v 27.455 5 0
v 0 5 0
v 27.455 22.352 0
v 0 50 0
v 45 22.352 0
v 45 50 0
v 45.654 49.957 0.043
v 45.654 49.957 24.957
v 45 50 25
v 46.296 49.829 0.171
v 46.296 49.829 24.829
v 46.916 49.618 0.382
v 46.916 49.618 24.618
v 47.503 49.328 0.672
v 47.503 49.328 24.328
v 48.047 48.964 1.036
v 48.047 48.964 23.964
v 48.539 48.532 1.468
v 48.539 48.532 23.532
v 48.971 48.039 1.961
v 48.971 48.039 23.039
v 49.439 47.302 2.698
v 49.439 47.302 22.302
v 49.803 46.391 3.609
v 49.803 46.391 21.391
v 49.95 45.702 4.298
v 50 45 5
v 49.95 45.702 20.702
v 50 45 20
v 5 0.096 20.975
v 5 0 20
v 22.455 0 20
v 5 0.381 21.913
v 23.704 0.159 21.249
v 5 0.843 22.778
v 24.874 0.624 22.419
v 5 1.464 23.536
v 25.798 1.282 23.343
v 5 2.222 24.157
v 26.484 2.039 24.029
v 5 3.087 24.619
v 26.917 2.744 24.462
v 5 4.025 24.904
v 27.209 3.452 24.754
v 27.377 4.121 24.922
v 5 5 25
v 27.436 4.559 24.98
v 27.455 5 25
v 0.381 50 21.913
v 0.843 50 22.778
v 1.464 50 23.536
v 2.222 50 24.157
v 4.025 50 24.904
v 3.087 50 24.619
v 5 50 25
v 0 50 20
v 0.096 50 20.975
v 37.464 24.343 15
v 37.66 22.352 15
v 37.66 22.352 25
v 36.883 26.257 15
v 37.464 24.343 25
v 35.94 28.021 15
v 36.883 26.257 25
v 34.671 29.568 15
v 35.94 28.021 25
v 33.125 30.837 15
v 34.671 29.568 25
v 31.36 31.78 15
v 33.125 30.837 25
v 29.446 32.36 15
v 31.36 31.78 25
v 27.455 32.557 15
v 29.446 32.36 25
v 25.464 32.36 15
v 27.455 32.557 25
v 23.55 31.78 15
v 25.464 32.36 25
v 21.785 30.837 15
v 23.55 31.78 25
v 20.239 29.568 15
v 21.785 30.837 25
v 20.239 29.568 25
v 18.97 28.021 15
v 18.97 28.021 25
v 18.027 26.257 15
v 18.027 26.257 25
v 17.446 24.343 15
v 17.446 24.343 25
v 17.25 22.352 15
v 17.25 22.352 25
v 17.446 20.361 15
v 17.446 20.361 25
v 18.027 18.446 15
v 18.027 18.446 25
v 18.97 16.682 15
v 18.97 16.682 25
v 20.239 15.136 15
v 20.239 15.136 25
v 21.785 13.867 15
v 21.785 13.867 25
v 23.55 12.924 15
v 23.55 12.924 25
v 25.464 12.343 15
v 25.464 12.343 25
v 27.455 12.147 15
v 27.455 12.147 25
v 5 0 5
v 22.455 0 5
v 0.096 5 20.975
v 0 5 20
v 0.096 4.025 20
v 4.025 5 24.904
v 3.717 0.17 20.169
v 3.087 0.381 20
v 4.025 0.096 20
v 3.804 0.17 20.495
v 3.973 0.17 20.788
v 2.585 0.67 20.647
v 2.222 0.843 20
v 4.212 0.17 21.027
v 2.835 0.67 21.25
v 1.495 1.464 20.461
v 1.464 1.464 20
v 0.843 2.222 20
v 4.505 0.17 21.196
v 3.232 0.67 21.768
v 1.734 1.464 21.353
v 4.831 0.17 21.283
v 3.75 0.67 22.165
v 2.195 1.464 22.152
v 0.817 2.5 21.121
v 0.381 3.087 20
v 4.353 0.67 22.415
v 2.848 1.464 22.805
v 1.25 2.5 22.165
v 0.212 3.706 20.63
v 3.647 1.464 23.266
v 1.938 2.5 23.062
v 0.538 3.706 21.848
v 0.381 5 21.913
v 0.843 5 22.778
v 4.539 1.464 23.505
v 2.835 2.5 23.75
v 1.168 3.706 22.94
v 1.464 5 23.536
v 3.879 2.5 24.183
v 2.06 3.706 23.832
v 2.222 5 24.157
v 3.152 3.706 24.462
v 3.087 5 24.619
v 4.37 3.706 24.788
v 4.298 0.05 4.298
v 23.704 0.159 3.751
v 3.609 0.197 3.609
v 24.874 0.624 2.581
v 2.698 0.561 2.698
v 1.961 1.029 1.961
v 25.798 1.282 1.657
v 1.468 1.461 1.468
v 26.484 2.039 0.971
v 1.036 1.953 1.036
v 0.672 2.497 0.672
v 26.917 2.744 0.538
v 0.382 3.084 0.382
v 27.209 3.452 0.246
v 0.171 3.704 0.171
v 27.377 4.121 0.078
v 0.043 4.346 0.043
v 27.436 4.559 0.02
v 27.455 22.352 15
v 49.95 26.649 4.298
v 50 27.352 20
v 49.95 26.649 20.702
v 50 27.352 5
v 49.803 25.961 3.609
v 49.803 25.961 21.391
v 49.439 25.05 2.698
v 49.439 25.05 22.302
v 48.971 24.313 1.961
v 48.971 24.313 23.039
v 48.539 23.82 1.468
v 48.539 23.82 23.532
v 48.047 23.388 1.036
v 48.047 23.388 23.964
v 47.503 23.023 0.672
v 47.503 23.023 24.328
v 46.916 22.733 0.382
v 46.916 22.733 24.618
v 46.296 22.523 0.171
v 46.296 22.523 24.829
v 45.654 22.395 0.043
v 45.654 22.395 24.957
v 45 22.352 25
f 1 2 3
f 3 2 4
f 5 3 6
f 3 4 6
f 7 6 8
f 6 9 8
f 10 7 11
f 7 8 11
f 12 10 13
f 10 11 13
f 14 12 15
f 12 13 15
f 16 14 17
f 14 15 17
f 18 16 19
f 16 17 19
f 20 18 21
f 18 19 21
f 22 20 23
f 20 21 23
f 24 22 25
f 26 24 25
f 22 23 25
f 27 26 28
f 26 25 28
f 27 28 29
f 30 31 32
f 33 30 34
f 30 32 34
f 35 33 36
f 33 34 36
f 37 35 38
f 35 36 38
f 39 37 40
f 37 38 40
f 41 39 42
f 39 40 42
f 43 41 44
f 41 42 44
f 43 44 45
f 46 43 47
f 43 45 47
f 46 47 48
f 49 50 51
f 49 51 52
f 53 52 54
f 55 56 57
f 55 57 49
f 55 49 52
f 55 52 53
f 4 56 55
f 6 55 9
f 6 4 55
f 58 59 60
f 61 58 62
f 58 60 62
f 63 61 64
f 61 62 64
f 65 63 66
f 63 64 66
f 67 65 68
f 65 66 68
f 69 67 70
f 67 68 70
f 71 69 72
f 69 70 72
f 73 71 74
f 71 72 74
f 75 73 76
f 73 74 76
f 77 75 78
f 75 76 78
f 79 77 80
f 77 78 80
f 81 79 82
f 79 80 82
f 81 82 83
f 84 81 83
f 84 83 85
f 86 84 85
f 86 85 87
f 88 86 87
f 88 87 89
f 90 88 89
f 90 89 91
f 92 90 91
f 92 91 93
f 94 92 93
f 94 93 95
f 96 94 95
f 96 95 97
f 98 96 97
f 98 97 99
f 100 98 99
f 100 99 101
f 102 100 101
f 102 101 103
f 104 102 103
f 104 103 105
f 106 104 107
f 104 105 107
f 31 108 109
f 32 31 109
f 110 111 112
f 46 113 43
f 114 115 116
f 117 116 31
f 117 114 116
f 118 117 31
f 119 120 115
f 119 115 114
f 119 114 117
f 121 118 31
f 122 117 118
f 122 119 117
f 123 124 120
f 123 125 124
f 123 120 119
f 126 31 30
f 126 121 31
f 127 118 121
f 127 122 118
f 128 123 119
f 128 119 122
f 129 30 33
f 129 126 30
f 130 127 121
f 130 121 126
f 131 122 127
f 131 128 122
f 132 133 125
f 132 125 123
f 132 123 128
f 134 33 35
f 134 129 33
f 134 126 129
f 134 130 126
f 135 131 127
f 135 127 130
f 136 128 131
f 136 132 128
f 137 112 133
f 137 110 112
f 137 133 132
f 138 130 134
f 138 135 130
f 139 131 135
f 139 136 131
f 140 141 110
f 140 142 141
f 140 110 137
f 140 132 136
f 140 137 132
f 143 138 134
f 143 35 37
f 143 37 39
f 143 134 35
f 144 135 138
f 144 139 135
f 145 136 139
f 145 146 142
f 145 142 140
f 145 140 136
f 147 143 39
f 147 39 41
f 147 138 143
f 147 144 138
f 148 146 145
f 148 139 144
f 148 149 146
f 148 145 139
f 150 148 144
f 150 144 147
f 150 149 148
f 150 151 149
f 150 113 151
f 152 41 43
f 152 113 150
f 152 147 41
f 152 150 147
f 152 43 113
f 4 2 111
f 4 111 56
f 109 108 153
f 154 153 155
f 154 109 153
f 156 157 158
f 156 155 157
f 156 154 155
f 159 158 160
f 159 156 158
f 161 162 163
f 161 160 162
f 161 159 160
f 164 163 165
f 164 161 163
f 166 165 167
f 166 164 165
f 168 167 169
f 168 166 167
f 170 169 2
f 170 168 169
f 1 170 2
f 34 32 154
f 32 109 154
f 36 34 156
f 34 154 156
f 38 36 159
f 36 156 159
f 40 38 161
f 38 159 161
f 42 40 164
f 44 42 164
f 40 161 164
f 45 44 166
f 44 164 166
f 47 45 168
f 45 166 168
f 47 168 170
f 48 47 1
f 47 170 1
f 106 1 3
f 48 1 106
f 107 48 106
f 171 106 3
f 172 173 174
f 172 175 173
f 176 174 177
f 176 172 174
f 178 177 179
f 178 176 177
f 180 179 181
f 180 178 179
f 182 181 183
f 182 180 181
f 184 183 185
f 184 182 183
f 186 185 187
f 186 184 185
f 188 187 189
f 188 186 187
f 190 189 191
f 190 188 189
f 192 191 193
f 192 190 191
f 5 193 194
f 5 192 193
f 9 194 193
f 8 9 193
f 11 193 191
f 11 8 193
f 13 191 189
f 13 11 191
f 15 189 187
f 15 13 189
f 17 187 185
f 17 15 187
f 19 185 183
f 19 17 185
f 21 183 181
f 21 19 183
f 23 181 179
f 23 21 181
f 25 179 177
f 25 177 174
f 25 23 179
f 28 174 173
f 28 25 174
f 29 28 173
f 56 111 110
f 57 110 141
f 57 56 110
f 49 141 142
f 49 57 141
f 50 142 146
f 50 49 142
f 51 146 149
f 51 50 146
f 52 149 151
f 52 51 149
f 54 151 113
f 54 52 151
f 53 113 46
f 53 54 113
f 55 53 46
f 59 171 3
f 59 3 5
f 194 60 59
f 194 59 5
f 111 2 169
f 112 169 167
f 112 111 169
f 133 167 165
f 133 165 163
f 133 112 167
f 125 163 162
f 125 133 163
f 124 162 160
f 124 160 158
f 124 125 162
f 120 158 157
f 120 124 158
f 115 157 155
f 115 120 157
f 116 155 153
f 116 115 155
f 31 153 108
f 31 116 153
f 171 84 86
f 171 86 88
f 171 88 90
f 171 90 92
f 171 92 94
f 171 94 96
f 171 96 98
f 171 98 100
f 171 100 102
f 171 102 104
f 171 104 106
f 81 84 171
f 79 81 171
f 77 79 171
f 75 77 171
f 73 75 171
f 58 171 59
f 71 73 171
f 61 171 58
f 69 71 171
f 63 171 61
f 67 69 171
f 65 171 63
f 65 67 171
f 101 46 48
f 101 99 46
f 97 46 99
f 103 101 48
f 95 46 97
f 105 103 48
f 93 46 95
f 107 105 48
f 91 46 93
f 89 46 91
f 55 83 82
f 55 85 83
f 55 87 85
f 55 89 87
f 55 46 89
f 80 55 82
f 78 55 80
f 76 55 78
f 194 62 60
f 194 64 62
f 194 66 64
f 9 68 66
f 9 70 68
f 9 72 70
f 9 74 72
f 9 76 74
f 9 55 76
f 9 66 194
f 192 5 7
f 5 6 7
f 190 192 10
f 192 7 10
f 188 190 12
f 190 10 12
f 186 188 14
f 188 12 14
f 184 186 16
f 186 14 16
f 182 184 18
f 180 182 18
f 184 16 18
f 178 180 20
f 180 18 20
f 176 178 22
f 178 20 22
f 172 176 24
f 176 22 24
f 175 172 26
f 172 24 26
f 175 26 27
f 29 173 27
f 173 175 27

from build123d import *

# Parameters (mm, degrees)
F0_W     = 50
F0_H     = 50
F1_DEPTH = 25
F2_R     = 10.2048696912
F3_DEPTH = 10
F4_W     = 22.5449811667
F4_H     = 22.3516840488
F5_DEPTH = 25
F6_R     = 5


with BuildPart() as f1:
    # F0 (on Top) → F1 (new body)
    with BuildSketch(Plane.XY):
        with Locations((25, 25)):
            Rectangle(F0_W, F0_H)
    extrude(amount=F1_DEPTH)

    # F2 (on face) → F3 (cut)
    with BuildSketch(Plane.XY.offset(25)):
        with Locations((27.4550188333, 22.3516840488)):
            Circle(F2_R)
    extrude(amount=-F3_DEPTH, mode=Mode.SUBTRACT)

    # F4 (on face) → F5 (cut)
    with BuildSketch(Plane.XY.offset(25)):
        with Locations((38.7275094166, 11.1758420244)):
            Rectangle(F4_W, F4_H)
    extrude(amount=-F5_DEPTH, mode=Mode.SUBTRACT)

    # F6
    f6_edges = [f1.edges().sort_by_distance(p)[0] for p in [
        (0, 25, 25),
        (0, 0, 12.5),
        (13.727509, 0, 0),
        (27.455019, 0, 12.5),
        (13.727509, 0, 25),
        (50, 36.175842, 25),
        (50, 50, 12.5),
        (50, 36.175842, 0),
        (50, 22.351684, 12.5),
    ]]
    fillet(f6_edges, radius=F6_R)


solid = f1.part
